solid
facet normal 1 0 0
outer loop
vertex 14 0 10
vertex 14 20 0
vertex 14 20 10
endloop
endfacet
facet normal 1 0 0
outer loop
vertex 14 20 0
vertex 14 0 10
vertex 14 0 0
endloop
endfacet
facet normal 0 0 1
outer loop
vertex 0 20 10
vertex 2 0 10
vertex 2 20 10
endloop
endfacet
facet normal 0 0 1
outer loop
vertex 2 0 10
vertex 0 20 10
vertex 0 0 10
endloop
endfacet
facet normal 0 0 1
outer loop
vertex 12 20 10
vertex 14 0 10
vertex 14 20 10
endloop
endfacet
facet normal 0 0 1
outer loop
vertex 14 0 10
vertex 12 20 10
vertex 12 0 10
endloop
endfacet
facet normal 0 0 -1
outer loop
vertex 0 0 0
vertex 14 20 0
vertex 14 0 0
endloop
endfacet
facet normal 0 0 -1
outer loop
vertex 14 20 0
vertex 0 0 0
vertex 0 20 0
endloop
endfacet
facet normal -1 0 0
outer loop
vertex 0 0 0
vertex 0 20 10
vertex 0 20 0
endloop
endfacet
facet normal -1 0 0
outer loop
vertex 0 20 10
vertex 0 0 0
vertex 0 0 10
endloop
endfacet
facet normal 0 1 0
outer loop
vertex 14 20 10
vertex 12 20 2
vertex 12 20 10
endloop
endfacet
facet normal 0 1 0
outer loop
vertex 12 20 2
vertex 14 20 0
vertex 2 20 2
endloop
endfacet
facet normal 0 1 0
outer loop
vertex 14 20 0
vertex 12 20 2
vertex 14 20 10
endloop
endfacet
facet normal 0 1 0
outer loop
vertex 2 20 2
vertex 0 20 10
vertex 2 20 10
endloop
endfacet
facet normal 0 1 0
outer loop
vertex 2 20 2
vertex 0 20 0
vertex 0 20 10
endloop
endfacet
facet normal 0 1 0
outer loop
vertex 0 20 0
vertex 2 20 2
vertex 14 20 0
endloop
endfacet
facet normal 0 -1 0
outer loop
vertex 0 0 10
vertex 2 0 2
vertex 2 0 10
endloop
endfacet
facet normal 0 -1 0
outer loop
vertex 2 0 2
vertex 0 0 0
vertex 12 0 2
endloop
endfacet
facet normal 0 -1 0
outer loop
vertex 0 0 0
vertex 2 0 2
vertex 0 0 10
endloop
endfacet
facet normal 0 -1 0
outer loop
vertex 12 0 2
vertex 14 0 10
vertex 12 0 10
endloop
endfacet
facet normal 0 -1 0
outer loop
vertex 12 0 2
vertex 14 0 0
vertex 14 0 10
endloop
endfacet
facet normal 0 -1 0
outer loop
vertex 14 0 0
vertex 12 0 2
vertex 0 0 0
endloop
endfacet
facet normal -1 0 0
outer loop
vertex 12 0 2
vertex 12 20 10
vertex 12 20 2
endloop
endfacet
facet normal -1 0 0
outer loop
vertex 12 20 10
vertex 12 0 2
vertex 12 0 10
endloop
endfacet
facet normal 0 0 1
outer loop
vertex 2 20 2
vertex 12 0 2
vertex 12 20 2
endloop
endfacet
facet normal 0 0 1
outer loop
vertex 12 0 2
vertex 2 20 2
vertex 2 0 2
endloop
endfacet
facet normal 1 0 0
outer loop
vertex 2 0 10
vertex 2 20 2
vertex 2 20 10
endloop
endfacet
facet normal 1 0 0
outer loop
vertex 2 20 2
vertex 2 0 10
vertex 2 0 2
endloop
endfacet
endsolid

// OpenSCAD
// Generated by scadwright. Do not hand-edit —
// edit the Python source and regenerate.

// UShapeChannel
difference() {
    cube([14, 20, 10], center=false);
    translate([2, -0.01, 2]) {
        cube([10, 20.02, 8.02], center=false);
    }
}
